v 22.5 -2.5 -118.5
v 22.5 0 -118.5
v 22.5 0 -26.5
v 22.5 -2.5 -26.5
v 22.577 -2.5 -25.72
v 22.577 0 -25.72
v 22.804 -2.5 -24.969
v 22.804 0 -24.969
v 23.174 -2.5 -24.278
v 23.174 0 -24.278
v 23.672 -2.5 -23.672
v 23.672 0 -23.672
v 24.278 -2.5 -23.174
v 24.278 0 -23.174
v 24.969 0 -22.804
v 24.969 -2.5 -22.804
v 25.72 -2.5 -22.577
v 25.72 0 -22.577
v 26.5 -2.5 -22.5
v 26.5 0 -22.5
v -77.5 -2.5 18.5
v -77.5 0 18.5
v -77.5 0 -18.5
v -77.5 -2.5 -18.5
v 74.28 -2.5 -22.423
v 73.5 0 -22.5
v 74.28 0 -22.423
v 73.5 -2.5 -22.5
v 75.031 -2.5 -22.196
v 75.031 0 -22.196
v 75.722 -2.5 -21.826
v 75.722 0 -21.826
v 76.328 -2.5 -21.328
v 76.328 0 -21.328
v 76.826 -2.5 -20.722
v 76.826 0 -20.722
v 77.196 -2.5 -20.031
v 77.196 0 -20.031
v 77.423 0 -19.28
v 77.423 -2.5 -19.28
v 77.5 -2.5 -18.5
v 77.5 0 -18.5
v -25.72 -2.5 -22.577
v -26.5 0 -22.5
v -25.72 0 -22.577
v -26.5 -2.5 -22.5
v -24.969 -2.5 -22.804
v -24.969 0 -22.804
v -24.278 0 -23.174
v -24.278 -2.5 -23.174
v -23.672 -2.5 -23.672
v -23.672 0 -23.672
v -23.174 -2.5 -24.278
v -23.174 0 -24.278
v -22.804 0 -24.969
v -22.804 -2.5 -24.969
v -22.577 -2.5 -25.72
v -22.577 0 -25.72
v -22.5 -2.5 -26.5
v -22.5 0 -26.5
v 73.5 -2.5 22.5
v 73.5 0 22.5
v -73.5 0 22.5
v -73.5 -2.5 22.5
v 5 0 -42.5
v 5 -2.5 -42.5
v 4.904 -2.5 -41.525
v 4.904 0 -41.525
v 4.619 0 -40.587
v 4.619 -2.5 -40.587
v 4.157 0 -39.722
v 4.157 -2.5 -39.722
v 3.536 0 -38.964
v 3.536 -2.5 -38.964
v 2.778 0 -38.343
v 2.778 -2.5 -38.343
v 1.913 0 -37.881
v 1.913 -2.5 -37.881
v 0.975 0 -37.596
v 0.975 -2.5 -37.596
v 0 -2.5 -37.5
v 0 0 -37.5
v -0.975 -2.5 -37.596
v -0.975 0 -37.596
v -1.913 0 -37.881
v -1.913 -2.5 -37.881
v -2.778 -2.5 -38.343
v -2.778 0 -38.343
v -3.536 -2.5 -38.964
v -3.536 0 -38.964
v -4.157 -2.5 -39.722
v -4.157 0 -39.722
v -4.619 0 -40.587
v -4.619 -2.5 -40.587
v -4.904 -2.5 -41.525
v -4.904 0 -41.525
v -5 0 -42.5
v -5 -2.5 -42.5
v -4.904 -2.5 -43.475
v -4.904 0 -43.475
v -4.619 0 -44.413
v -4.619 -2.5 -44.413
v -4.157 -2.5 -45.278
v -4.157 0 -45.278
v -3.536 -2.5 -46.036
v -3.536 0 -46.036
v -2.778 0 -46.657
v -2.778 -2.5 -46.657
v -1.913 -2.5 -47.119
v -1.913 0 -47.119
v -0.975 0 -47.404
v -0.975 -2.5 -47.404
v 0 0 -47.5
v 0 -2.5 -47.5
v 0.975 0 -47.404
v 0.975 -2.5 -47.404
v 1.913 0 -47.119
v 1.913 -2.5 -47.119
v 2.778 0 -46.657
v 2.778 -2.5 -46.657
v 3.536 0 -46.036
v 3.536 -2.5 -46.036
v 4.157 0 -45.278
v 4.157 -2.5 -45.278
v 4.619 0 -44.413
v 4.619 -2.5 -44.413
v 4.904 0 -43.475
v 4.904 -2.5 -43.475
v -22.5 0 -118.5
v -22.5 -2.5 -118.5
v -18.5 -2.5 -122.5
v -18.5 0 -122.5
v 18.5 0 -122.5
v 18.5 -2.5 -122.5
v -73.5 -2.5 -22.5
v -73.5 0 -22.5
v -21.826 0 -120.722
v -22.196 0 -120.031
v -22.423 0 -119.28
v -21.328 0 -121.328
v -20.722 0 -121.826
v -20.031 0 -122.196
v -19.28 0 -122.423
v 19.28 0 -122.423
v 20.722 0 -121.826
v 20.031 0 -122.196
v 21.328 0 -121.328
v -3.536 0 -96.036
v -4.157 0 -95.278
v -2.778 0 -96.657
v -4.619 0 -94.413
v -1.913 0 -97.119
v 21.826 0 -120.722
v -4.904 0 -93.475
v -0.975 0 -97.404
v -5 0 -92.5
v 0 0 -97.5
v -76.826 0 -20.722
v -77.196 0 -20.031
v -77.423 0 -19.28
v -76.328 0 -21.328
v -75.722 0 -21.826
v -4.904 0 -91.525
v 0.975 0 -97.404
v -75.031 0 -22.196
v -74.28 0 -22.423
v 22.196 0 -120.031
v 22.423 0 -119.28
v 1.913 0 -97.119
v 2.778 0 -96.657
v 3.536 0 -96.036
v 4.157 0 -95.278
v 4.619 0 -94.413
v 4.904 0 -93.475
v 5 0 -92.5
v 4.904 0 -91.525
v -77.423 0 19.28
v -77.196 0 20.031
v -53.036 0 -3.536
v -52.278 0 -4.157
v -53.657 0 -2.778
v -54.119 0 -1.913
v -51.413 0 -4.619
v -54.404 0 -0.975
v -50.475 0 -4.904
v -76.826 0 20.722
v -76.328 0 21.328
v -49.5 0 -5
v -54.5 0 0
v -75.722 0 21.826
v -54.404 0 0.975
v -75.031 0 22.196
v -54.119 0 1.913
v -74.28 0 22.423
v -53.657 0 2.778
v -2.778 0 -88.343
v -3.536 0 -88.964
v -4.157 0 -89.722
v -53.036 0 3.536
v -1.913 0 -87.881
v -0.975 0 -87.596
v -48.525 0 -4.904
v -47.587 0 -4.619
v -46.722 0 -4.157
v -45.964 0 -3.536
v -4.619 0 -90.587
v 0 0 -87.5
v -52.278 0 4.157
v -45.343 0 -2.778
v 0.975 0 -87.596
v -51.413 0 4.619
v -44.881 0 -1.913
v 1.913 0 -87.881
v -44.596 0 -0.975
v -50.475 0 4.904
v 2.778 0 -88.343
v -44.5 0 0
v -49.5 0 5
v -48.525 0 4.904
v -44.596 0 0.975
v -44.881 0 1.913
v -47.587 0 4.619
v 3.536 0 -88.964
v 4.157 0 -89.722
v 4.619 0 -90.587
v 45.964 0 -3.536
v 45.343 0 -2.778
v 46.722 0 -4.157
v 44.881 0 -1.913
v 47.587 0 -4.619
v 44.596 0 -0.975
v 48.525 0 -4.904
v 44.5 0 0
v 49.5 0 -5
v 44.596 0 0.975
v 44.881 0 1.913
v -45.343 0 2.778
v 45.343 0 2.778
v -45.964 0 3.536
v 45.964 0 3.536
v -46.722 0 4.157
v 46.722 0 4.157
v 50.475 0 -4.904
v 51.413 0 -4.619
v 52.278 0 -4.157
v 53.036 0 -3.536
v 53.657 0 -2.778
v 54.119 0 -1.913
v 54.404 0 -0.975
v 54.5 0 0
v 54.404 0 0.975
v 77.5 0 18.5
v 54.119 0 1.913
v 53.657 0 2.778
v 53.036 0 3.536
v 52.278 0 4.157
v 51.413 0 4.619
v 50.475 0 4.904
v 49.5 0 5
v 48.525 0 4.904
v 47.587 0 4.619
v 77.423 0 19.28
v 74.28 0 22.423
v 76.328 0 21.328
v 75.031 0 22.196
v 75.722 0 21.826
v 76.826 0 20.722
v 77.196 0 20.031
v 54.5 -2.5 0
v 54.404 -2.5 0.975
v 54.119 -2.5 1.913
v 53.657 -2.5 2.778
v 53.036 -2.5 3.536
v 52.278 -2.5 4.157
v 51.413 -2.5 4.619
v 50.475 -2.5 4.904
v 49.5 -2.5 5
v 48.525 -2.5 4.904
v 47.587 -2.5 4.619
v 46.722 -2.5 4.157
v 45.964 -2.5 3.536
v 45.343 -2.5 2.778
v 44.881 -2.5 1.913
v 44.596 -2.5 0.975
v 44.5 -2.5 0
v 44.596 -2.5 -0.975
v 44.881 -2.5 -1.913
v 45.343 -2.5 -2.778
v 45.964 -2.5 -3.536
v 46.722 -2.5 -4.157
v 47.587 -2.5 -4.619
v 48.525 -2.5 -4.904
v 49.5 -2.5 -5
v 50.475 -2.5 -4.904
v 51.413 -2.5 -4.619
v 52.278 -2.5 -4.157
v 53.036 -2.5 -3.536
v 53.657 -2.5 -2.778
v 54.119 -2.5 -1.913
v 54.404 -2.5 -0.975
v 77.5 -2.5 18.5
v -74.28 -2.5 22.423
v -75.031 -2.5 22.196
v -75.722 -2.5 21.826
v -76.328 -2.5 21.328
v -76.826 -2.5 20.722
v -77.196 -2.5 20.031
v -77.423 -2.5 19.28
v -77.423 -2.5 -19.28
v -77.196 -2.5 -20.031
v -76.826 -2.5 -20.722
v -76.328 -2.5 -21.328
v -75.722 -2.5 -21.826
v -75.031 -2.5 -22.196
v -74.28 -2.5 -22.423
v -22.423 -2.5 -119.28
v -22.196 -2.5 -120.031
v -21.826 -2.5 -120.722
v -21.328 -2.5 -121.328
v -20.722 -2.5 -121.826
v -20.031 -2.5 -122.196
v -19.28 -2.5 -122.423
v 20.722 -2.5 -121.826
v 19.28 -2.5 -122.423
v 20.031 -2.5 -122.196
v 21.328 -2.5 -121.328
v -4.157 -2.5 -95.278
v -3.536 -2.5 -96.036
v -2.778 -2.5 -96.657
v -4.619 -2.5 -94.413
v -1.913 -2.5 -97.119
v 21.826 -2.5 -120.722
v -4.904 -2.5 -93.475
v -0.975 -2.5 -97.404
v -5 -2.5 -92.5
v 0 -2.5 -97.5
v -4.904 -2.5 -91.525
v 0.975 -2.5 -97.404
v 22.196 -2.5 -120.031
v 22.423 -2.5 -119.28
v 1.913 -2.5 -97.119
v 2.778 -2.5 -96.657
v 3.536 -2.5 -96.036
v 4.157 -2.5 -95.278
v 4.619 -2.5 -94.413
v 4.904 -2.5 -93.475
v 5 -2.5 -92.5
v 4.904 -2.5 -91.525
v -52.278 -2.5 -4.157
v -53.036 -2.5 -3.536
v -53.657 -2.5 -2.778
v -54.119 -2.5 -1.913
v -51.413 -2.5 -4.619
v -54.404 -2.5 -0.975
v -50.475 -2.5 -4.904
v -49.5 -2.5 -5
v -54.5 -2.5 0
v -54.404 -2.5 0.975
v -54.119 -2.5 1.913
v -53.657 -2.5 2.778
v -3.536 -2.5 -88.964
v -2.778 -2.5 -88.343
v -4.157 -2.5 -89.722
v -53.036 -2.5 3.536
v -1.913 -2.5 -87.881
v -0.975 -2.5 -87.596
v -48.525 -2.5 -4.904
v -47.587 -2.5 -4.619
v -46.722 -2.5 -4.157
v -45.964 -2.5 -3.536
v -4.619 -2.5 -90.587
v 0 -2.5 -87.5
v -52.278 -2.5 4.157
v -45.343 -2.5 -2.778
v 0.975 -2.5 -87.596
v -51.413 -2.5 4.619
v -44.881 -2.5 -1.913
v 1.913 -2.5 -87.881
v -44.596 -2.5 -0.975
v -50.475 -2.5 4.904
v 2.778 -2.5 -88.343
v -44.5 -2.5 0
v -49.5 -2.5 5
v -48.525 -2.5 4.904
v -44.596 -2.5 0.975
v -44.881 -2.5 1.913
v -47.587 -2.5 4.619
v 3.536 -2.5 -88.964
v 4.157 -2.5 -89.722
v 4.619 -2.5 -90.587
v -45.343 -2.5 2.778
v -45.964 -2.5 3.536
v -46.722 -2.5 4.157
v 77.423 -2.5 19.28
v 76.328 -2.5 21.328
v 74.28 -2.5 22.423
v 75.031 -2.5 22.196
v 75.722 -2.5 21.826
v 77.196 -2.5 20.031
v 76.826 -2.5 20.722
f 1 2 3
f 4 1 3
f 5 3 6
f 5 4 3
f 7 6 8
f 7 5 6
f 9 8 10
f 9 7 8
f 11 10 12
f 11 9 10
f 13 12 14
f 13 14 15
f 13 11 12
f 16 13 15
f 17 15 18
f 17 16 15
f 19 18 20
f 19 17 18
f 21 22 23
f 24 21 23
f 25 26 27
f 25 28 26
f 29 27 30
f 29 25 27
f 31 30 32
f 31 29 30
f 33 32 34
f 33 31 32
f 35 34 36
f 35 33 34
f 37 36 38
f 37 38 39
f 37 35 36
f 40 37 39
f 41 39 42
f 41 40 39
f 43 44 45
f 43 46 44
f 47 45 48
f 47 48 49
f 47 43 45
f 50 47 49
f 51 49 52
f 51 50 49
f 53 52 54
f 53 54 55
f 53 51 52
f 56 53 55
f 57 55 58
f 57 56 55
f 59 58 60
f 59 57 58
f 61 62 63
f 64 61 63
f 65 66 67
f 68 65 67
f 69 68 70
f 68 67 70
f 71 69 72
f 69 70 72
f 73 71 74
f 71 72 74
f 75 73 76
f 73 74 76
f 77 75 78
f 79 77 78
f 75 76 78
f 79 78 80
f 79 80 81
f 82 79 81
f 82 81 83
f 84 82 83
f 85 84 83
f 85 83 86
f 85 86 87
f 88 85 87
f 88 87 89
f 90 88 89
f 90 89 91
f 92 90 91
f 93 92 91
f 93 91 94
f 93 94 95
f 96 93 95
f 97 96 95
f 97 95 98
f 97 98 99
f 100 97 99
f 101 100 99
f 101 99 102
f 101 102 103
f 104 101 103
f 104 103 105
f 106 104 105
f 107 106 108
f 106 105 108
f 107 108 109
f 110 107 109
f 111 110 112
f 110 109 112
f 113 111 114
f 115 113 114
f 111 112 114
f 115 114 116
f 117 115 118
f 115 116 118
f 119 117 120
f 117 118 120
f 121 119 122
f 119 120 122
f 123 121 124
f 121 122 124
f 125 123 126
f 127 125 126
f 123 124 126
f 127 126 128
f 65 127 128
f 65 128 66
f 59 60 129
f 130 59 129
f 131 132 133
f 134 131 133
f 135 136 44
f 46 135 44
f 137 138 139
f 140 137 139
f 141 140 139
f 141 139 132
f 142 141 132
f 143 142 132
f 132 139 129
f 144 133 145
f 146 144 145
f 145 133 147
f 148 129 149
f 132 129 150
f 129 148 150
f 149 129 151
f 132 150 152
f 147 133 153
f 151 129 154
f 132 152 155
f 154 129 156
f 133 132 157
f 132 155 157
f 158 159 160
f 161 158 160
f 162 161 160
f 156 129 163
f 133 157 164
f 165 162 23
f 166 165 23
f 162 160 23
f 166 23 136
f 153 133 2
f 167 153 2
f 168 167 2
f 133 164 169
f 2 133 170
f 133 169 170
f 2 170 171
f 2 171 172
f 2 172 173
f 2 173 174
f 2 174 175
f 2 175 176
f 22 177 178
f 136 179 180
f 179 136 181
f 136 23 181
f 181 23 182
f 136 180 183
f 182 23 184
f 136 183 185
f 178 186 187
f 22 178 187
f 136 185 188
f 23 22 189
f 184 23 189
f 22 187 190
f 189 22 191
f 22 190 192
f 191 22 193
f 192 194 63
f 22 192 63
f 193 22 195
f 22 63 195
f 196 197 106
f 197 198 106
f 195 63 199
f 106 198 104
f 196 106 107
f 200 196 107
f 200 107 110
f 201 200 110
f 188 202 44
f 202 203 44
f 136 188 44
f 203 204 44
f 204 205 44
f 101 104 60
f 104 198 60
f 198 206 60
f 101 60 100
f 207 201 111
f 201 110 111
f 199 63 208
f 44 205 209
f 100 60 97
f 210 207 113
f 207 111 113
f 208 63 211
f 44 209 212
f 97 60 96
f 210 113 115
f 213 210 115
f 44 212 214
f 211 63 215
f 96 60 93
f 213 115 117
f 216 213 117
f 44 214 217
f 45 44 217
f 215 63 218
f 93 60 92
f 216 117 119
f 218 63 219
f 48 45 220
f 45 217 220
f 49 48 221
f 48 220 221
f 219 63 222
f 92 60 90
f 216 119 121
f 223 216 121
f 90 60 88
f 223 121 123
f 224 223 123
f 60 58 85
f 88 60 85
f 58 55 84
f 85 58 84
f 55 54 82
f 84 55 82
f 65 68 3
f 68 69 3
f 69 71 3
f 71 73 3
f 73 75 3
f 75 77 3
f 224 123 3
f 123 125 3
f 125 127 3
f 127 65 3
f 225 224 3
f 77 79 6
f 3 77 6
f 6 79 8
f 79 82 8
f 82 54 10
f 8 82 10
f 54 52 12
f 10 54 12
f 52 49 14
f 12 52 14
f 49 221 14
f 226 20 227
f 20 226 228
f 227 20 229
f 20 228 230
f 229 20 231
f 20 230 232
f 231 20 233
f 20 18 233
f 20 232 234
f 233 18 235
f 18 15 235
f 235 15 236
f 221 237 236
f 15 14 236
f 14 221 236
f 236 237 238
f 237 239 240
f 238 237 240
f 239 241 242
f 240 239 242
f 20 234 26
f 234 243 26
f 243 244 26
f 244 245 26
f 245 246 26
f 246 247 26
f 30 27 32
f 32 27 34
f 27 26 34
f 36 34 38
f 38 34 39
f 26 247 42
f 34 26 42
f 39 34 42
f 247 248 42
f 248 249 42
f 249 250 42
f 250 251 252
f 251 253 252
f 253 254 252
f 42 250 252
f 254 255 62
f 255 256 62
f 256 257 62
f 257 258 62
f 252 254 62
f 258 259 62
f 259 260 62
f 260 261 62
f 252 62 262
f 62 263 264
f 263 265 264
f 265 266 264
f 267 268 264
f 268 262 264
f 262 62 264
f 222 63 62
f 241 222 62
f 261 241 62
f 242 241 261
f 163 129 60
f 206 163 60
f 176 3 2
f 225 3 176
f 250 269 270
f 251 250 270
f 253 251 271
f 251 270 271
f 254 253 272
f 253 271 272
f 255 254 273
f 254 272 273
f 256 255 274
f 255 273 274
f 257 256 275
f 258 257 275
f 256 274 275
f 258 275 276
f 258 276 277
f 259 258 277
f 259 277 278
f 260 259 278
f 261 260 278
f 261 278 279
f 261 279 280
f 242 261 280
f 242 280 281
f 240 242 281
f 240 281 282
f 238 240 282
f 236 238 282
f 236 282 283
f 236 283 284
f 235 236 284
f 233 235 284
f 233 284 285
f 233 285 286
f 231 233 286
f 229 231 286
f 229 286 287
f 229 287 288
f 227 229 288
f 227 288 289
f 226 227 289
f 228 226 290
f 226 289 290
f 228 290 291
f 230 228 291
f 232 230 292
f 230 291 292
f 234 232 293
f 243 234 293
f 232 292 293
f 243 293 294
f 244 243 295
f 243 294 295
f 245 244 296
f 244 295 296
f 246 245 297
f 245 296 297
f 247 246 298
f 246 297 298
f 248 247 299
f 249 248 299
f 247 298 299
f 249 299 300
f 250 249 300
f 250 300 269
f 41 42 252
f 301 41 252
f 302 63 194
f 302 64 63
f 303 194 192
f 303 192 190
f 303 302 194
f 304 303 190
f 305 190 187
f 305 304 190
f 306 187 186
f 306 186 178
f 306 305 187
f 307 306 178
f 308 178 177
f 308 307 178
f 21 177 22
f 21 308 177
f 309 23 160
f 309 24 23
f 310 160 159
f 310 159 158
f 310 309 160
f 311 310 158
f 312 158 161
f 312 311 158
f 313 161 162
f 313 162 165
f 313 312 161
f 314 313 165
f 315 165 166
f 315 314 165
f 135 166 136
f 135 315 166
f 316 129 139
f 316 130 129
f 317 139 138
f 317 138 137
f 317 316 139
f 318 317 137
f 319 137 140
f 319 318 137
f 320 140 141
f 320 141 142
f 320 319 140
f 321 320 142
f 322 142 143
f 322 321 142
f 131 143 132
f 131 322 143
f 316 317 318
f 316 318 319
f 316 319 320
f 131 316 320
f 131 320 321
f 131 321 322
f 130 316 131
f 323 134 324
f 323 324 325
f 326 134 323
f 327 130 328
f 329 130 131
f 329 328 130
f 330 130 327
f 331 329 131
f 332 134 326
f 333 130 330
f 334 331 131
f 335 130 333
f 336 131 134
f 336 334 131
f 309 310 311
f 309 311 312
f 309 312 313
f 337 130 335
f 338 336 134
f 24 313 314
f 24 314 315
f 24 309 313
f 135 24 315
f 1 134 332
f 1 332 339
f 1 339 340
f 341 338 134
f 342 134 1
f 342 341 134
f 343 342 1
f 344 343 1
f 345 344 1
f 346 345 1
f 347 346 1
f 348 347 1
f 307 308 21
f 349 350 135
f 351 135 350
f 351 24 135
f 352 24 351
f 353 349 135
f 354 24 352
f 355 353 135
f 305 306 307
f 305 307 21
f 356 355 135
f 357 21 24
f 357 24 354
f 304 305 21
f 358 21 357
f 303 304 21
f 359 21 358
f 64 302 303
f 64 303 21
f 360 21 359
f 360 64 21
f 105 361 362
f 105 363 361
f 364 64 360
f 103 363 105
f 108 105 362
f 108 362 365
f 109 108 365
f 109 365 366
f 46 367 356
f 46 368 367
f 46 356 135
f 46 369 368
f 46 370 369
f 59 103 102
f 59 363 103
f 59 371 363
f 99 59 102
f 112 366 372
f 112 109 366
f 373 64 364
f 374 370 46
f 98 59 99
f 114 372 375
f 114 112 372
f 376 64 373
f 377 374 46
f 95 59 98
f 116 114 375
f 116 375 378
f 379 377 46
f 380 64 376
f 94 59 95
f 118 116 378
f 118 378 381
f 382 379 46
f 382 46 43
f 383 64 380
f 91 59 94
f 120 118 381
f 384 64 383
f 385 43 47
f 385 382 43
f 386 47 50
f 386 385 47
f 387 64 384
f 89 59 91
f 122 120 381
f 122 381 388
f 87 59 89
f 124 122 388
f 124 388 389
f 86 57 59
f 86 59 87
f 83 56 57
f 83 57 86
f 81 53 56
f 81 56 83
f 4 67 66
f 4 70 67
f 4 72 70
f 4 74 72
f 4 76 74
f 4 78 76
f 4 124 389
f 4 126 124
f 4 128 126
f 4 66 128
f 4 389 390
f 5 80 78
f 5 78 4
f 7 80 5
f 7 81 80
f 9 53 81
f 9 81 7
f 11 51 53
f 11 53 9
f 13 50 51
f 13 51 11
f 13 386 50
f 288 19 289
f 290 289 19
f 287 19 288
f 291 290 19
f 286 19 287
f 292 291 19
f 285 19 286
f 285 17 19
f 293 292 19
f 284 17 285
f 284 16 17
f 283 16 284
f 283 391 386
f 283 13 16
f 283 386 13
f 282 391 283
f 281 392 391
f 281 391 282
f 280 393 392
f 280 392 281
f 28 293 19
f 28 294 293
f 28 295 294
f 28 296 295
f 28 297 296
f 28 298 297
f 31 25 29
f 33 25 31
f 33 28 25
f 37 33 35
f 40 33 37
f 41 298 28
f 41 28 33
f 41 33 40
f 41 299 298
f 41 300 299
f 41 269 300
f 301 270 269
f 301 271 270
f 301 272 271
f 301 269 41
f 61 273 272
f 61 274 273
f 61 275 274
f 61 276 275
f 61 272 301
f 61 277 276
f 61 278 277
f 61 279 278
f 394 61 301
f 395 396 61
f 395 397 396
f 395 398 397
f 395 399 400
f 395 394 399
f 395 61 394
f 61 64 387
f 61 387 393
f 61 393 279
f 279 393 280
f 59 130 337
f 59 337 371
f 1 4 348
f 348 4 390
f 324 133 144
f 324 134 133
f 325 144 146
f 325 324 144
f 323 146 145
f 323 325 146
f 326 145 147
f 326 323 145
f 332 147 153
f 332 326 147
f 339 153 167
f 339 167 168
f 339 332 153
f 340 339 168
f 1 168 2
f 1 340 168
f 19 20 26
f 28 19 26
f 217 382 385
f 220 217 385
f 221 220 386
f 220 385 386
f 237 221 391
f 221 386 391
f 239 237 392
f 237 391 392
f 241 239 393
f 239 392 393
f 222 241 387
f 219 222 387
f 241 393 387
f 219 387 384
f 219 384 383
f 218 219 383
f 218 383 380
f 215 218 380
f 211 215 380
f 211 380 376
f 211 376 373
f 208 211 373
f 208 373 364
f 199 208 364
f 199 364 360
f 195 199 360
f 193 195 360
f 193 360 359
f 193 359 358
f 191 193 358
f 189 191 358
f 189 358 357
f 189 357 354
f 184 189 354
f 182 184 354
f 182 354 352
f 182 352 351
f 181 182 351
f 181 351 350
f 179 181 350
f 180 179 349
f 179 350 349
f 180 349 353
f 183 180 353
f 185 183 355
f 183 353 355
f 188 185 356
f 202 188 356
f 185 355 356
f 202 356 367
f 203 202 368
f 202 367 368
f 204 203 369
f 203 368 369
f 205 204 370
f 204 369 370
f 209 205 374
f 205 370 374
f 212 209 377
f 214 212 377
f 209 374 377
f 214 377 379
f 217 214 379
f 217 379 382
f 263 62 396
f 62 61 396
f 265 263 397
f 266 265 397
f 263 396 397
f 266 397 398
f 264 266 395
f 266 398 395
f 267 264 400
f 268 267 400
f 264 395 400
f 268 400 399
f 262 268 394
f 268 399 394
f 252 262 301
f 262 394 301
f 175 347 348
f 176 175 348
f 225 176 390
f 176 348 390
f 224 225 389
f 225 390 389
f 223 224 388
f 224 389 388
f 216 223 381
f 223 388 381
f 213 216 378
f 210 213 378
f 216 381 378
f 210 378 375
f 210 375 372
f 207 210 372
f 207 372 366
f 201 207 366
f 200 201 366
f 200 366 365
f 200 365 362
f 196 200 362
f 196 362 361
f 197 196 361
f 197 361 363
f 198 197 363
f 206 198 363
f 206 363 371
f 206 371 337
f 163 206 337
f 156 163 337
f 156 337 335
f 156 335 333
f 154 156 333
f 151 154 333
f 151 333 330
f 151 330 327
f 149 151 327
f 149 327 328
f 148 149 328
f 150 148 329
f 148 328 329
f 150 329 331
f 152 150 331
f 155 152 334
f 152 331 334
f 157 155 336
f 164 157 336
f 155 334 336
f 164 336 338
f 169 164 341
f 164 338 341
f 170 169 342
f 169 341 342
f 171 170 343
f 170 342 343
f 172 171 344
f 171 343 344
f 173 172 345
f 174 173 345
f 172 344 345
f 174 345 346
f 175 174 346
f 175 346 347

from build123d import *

# Parameters (mm, degrees)
F1_DEPTH = 2.5
F2_R     = 4
F3_R     = 5
F4_DEPTH = 2.501
F5_R     = 5
F6_DEPTH = 2.501


with BuildPart() as f1:
    # F0 (on Front) → F1 (new body)
    with BuildSketch(Plane.XZ):
        Polygon((77.5, 22.5), (-77.5, 22.5), (-77.5, -22.5), (-22.5, -22.5), (-22.5, -122.5), (22.5, -122.5), (22.5, -22.5), (77.5, -22.5), align=None)
    extrude(amount=F1_DEPTH)

    # F2
    f2_edges = [f1.edges().sort_by_distance(p)[0] for p in [
        (-77.5, -1.25, 22.5),
        (-77.5, -1.25, -22.5),
        (77.5, -1.25, 22.5),
        (77.5, -1.25, -22.5),
        (22.5, -1.25, -122.5),
        (-22.5, -1.25, -122.5),
        (22.5, -1.25, -22.5),
        (-22.5, -1.25, -22.5),
    ]]
    fillet(f2_edges, radius=F2_R)

    # F3 (on face) → F4 (cut, through all)
    with BuildSketch(Plane.XZ.offset(2.5)):
        with Locations((49.5, 0)):
            Circle(F3_R)
        with Locations((-49.5, 0)):
            Circle(F3_R)
        with Locations((0, -92.5)):
            Circle(F3_R)
    extrude(amount=-F4_DEPTH, mode=Mode.SUBTRACT)

    # F5 (on face) → F6 (cut, through all)
    with BuildSketch(Plane.XZ.offset(2.5)):
        with Locations((0, -42.5)):
            Circle(F5_R)
    extrude(amount=-F6_DEPTH, mode=Mode.SUBTRACT)


solid = f1.part
